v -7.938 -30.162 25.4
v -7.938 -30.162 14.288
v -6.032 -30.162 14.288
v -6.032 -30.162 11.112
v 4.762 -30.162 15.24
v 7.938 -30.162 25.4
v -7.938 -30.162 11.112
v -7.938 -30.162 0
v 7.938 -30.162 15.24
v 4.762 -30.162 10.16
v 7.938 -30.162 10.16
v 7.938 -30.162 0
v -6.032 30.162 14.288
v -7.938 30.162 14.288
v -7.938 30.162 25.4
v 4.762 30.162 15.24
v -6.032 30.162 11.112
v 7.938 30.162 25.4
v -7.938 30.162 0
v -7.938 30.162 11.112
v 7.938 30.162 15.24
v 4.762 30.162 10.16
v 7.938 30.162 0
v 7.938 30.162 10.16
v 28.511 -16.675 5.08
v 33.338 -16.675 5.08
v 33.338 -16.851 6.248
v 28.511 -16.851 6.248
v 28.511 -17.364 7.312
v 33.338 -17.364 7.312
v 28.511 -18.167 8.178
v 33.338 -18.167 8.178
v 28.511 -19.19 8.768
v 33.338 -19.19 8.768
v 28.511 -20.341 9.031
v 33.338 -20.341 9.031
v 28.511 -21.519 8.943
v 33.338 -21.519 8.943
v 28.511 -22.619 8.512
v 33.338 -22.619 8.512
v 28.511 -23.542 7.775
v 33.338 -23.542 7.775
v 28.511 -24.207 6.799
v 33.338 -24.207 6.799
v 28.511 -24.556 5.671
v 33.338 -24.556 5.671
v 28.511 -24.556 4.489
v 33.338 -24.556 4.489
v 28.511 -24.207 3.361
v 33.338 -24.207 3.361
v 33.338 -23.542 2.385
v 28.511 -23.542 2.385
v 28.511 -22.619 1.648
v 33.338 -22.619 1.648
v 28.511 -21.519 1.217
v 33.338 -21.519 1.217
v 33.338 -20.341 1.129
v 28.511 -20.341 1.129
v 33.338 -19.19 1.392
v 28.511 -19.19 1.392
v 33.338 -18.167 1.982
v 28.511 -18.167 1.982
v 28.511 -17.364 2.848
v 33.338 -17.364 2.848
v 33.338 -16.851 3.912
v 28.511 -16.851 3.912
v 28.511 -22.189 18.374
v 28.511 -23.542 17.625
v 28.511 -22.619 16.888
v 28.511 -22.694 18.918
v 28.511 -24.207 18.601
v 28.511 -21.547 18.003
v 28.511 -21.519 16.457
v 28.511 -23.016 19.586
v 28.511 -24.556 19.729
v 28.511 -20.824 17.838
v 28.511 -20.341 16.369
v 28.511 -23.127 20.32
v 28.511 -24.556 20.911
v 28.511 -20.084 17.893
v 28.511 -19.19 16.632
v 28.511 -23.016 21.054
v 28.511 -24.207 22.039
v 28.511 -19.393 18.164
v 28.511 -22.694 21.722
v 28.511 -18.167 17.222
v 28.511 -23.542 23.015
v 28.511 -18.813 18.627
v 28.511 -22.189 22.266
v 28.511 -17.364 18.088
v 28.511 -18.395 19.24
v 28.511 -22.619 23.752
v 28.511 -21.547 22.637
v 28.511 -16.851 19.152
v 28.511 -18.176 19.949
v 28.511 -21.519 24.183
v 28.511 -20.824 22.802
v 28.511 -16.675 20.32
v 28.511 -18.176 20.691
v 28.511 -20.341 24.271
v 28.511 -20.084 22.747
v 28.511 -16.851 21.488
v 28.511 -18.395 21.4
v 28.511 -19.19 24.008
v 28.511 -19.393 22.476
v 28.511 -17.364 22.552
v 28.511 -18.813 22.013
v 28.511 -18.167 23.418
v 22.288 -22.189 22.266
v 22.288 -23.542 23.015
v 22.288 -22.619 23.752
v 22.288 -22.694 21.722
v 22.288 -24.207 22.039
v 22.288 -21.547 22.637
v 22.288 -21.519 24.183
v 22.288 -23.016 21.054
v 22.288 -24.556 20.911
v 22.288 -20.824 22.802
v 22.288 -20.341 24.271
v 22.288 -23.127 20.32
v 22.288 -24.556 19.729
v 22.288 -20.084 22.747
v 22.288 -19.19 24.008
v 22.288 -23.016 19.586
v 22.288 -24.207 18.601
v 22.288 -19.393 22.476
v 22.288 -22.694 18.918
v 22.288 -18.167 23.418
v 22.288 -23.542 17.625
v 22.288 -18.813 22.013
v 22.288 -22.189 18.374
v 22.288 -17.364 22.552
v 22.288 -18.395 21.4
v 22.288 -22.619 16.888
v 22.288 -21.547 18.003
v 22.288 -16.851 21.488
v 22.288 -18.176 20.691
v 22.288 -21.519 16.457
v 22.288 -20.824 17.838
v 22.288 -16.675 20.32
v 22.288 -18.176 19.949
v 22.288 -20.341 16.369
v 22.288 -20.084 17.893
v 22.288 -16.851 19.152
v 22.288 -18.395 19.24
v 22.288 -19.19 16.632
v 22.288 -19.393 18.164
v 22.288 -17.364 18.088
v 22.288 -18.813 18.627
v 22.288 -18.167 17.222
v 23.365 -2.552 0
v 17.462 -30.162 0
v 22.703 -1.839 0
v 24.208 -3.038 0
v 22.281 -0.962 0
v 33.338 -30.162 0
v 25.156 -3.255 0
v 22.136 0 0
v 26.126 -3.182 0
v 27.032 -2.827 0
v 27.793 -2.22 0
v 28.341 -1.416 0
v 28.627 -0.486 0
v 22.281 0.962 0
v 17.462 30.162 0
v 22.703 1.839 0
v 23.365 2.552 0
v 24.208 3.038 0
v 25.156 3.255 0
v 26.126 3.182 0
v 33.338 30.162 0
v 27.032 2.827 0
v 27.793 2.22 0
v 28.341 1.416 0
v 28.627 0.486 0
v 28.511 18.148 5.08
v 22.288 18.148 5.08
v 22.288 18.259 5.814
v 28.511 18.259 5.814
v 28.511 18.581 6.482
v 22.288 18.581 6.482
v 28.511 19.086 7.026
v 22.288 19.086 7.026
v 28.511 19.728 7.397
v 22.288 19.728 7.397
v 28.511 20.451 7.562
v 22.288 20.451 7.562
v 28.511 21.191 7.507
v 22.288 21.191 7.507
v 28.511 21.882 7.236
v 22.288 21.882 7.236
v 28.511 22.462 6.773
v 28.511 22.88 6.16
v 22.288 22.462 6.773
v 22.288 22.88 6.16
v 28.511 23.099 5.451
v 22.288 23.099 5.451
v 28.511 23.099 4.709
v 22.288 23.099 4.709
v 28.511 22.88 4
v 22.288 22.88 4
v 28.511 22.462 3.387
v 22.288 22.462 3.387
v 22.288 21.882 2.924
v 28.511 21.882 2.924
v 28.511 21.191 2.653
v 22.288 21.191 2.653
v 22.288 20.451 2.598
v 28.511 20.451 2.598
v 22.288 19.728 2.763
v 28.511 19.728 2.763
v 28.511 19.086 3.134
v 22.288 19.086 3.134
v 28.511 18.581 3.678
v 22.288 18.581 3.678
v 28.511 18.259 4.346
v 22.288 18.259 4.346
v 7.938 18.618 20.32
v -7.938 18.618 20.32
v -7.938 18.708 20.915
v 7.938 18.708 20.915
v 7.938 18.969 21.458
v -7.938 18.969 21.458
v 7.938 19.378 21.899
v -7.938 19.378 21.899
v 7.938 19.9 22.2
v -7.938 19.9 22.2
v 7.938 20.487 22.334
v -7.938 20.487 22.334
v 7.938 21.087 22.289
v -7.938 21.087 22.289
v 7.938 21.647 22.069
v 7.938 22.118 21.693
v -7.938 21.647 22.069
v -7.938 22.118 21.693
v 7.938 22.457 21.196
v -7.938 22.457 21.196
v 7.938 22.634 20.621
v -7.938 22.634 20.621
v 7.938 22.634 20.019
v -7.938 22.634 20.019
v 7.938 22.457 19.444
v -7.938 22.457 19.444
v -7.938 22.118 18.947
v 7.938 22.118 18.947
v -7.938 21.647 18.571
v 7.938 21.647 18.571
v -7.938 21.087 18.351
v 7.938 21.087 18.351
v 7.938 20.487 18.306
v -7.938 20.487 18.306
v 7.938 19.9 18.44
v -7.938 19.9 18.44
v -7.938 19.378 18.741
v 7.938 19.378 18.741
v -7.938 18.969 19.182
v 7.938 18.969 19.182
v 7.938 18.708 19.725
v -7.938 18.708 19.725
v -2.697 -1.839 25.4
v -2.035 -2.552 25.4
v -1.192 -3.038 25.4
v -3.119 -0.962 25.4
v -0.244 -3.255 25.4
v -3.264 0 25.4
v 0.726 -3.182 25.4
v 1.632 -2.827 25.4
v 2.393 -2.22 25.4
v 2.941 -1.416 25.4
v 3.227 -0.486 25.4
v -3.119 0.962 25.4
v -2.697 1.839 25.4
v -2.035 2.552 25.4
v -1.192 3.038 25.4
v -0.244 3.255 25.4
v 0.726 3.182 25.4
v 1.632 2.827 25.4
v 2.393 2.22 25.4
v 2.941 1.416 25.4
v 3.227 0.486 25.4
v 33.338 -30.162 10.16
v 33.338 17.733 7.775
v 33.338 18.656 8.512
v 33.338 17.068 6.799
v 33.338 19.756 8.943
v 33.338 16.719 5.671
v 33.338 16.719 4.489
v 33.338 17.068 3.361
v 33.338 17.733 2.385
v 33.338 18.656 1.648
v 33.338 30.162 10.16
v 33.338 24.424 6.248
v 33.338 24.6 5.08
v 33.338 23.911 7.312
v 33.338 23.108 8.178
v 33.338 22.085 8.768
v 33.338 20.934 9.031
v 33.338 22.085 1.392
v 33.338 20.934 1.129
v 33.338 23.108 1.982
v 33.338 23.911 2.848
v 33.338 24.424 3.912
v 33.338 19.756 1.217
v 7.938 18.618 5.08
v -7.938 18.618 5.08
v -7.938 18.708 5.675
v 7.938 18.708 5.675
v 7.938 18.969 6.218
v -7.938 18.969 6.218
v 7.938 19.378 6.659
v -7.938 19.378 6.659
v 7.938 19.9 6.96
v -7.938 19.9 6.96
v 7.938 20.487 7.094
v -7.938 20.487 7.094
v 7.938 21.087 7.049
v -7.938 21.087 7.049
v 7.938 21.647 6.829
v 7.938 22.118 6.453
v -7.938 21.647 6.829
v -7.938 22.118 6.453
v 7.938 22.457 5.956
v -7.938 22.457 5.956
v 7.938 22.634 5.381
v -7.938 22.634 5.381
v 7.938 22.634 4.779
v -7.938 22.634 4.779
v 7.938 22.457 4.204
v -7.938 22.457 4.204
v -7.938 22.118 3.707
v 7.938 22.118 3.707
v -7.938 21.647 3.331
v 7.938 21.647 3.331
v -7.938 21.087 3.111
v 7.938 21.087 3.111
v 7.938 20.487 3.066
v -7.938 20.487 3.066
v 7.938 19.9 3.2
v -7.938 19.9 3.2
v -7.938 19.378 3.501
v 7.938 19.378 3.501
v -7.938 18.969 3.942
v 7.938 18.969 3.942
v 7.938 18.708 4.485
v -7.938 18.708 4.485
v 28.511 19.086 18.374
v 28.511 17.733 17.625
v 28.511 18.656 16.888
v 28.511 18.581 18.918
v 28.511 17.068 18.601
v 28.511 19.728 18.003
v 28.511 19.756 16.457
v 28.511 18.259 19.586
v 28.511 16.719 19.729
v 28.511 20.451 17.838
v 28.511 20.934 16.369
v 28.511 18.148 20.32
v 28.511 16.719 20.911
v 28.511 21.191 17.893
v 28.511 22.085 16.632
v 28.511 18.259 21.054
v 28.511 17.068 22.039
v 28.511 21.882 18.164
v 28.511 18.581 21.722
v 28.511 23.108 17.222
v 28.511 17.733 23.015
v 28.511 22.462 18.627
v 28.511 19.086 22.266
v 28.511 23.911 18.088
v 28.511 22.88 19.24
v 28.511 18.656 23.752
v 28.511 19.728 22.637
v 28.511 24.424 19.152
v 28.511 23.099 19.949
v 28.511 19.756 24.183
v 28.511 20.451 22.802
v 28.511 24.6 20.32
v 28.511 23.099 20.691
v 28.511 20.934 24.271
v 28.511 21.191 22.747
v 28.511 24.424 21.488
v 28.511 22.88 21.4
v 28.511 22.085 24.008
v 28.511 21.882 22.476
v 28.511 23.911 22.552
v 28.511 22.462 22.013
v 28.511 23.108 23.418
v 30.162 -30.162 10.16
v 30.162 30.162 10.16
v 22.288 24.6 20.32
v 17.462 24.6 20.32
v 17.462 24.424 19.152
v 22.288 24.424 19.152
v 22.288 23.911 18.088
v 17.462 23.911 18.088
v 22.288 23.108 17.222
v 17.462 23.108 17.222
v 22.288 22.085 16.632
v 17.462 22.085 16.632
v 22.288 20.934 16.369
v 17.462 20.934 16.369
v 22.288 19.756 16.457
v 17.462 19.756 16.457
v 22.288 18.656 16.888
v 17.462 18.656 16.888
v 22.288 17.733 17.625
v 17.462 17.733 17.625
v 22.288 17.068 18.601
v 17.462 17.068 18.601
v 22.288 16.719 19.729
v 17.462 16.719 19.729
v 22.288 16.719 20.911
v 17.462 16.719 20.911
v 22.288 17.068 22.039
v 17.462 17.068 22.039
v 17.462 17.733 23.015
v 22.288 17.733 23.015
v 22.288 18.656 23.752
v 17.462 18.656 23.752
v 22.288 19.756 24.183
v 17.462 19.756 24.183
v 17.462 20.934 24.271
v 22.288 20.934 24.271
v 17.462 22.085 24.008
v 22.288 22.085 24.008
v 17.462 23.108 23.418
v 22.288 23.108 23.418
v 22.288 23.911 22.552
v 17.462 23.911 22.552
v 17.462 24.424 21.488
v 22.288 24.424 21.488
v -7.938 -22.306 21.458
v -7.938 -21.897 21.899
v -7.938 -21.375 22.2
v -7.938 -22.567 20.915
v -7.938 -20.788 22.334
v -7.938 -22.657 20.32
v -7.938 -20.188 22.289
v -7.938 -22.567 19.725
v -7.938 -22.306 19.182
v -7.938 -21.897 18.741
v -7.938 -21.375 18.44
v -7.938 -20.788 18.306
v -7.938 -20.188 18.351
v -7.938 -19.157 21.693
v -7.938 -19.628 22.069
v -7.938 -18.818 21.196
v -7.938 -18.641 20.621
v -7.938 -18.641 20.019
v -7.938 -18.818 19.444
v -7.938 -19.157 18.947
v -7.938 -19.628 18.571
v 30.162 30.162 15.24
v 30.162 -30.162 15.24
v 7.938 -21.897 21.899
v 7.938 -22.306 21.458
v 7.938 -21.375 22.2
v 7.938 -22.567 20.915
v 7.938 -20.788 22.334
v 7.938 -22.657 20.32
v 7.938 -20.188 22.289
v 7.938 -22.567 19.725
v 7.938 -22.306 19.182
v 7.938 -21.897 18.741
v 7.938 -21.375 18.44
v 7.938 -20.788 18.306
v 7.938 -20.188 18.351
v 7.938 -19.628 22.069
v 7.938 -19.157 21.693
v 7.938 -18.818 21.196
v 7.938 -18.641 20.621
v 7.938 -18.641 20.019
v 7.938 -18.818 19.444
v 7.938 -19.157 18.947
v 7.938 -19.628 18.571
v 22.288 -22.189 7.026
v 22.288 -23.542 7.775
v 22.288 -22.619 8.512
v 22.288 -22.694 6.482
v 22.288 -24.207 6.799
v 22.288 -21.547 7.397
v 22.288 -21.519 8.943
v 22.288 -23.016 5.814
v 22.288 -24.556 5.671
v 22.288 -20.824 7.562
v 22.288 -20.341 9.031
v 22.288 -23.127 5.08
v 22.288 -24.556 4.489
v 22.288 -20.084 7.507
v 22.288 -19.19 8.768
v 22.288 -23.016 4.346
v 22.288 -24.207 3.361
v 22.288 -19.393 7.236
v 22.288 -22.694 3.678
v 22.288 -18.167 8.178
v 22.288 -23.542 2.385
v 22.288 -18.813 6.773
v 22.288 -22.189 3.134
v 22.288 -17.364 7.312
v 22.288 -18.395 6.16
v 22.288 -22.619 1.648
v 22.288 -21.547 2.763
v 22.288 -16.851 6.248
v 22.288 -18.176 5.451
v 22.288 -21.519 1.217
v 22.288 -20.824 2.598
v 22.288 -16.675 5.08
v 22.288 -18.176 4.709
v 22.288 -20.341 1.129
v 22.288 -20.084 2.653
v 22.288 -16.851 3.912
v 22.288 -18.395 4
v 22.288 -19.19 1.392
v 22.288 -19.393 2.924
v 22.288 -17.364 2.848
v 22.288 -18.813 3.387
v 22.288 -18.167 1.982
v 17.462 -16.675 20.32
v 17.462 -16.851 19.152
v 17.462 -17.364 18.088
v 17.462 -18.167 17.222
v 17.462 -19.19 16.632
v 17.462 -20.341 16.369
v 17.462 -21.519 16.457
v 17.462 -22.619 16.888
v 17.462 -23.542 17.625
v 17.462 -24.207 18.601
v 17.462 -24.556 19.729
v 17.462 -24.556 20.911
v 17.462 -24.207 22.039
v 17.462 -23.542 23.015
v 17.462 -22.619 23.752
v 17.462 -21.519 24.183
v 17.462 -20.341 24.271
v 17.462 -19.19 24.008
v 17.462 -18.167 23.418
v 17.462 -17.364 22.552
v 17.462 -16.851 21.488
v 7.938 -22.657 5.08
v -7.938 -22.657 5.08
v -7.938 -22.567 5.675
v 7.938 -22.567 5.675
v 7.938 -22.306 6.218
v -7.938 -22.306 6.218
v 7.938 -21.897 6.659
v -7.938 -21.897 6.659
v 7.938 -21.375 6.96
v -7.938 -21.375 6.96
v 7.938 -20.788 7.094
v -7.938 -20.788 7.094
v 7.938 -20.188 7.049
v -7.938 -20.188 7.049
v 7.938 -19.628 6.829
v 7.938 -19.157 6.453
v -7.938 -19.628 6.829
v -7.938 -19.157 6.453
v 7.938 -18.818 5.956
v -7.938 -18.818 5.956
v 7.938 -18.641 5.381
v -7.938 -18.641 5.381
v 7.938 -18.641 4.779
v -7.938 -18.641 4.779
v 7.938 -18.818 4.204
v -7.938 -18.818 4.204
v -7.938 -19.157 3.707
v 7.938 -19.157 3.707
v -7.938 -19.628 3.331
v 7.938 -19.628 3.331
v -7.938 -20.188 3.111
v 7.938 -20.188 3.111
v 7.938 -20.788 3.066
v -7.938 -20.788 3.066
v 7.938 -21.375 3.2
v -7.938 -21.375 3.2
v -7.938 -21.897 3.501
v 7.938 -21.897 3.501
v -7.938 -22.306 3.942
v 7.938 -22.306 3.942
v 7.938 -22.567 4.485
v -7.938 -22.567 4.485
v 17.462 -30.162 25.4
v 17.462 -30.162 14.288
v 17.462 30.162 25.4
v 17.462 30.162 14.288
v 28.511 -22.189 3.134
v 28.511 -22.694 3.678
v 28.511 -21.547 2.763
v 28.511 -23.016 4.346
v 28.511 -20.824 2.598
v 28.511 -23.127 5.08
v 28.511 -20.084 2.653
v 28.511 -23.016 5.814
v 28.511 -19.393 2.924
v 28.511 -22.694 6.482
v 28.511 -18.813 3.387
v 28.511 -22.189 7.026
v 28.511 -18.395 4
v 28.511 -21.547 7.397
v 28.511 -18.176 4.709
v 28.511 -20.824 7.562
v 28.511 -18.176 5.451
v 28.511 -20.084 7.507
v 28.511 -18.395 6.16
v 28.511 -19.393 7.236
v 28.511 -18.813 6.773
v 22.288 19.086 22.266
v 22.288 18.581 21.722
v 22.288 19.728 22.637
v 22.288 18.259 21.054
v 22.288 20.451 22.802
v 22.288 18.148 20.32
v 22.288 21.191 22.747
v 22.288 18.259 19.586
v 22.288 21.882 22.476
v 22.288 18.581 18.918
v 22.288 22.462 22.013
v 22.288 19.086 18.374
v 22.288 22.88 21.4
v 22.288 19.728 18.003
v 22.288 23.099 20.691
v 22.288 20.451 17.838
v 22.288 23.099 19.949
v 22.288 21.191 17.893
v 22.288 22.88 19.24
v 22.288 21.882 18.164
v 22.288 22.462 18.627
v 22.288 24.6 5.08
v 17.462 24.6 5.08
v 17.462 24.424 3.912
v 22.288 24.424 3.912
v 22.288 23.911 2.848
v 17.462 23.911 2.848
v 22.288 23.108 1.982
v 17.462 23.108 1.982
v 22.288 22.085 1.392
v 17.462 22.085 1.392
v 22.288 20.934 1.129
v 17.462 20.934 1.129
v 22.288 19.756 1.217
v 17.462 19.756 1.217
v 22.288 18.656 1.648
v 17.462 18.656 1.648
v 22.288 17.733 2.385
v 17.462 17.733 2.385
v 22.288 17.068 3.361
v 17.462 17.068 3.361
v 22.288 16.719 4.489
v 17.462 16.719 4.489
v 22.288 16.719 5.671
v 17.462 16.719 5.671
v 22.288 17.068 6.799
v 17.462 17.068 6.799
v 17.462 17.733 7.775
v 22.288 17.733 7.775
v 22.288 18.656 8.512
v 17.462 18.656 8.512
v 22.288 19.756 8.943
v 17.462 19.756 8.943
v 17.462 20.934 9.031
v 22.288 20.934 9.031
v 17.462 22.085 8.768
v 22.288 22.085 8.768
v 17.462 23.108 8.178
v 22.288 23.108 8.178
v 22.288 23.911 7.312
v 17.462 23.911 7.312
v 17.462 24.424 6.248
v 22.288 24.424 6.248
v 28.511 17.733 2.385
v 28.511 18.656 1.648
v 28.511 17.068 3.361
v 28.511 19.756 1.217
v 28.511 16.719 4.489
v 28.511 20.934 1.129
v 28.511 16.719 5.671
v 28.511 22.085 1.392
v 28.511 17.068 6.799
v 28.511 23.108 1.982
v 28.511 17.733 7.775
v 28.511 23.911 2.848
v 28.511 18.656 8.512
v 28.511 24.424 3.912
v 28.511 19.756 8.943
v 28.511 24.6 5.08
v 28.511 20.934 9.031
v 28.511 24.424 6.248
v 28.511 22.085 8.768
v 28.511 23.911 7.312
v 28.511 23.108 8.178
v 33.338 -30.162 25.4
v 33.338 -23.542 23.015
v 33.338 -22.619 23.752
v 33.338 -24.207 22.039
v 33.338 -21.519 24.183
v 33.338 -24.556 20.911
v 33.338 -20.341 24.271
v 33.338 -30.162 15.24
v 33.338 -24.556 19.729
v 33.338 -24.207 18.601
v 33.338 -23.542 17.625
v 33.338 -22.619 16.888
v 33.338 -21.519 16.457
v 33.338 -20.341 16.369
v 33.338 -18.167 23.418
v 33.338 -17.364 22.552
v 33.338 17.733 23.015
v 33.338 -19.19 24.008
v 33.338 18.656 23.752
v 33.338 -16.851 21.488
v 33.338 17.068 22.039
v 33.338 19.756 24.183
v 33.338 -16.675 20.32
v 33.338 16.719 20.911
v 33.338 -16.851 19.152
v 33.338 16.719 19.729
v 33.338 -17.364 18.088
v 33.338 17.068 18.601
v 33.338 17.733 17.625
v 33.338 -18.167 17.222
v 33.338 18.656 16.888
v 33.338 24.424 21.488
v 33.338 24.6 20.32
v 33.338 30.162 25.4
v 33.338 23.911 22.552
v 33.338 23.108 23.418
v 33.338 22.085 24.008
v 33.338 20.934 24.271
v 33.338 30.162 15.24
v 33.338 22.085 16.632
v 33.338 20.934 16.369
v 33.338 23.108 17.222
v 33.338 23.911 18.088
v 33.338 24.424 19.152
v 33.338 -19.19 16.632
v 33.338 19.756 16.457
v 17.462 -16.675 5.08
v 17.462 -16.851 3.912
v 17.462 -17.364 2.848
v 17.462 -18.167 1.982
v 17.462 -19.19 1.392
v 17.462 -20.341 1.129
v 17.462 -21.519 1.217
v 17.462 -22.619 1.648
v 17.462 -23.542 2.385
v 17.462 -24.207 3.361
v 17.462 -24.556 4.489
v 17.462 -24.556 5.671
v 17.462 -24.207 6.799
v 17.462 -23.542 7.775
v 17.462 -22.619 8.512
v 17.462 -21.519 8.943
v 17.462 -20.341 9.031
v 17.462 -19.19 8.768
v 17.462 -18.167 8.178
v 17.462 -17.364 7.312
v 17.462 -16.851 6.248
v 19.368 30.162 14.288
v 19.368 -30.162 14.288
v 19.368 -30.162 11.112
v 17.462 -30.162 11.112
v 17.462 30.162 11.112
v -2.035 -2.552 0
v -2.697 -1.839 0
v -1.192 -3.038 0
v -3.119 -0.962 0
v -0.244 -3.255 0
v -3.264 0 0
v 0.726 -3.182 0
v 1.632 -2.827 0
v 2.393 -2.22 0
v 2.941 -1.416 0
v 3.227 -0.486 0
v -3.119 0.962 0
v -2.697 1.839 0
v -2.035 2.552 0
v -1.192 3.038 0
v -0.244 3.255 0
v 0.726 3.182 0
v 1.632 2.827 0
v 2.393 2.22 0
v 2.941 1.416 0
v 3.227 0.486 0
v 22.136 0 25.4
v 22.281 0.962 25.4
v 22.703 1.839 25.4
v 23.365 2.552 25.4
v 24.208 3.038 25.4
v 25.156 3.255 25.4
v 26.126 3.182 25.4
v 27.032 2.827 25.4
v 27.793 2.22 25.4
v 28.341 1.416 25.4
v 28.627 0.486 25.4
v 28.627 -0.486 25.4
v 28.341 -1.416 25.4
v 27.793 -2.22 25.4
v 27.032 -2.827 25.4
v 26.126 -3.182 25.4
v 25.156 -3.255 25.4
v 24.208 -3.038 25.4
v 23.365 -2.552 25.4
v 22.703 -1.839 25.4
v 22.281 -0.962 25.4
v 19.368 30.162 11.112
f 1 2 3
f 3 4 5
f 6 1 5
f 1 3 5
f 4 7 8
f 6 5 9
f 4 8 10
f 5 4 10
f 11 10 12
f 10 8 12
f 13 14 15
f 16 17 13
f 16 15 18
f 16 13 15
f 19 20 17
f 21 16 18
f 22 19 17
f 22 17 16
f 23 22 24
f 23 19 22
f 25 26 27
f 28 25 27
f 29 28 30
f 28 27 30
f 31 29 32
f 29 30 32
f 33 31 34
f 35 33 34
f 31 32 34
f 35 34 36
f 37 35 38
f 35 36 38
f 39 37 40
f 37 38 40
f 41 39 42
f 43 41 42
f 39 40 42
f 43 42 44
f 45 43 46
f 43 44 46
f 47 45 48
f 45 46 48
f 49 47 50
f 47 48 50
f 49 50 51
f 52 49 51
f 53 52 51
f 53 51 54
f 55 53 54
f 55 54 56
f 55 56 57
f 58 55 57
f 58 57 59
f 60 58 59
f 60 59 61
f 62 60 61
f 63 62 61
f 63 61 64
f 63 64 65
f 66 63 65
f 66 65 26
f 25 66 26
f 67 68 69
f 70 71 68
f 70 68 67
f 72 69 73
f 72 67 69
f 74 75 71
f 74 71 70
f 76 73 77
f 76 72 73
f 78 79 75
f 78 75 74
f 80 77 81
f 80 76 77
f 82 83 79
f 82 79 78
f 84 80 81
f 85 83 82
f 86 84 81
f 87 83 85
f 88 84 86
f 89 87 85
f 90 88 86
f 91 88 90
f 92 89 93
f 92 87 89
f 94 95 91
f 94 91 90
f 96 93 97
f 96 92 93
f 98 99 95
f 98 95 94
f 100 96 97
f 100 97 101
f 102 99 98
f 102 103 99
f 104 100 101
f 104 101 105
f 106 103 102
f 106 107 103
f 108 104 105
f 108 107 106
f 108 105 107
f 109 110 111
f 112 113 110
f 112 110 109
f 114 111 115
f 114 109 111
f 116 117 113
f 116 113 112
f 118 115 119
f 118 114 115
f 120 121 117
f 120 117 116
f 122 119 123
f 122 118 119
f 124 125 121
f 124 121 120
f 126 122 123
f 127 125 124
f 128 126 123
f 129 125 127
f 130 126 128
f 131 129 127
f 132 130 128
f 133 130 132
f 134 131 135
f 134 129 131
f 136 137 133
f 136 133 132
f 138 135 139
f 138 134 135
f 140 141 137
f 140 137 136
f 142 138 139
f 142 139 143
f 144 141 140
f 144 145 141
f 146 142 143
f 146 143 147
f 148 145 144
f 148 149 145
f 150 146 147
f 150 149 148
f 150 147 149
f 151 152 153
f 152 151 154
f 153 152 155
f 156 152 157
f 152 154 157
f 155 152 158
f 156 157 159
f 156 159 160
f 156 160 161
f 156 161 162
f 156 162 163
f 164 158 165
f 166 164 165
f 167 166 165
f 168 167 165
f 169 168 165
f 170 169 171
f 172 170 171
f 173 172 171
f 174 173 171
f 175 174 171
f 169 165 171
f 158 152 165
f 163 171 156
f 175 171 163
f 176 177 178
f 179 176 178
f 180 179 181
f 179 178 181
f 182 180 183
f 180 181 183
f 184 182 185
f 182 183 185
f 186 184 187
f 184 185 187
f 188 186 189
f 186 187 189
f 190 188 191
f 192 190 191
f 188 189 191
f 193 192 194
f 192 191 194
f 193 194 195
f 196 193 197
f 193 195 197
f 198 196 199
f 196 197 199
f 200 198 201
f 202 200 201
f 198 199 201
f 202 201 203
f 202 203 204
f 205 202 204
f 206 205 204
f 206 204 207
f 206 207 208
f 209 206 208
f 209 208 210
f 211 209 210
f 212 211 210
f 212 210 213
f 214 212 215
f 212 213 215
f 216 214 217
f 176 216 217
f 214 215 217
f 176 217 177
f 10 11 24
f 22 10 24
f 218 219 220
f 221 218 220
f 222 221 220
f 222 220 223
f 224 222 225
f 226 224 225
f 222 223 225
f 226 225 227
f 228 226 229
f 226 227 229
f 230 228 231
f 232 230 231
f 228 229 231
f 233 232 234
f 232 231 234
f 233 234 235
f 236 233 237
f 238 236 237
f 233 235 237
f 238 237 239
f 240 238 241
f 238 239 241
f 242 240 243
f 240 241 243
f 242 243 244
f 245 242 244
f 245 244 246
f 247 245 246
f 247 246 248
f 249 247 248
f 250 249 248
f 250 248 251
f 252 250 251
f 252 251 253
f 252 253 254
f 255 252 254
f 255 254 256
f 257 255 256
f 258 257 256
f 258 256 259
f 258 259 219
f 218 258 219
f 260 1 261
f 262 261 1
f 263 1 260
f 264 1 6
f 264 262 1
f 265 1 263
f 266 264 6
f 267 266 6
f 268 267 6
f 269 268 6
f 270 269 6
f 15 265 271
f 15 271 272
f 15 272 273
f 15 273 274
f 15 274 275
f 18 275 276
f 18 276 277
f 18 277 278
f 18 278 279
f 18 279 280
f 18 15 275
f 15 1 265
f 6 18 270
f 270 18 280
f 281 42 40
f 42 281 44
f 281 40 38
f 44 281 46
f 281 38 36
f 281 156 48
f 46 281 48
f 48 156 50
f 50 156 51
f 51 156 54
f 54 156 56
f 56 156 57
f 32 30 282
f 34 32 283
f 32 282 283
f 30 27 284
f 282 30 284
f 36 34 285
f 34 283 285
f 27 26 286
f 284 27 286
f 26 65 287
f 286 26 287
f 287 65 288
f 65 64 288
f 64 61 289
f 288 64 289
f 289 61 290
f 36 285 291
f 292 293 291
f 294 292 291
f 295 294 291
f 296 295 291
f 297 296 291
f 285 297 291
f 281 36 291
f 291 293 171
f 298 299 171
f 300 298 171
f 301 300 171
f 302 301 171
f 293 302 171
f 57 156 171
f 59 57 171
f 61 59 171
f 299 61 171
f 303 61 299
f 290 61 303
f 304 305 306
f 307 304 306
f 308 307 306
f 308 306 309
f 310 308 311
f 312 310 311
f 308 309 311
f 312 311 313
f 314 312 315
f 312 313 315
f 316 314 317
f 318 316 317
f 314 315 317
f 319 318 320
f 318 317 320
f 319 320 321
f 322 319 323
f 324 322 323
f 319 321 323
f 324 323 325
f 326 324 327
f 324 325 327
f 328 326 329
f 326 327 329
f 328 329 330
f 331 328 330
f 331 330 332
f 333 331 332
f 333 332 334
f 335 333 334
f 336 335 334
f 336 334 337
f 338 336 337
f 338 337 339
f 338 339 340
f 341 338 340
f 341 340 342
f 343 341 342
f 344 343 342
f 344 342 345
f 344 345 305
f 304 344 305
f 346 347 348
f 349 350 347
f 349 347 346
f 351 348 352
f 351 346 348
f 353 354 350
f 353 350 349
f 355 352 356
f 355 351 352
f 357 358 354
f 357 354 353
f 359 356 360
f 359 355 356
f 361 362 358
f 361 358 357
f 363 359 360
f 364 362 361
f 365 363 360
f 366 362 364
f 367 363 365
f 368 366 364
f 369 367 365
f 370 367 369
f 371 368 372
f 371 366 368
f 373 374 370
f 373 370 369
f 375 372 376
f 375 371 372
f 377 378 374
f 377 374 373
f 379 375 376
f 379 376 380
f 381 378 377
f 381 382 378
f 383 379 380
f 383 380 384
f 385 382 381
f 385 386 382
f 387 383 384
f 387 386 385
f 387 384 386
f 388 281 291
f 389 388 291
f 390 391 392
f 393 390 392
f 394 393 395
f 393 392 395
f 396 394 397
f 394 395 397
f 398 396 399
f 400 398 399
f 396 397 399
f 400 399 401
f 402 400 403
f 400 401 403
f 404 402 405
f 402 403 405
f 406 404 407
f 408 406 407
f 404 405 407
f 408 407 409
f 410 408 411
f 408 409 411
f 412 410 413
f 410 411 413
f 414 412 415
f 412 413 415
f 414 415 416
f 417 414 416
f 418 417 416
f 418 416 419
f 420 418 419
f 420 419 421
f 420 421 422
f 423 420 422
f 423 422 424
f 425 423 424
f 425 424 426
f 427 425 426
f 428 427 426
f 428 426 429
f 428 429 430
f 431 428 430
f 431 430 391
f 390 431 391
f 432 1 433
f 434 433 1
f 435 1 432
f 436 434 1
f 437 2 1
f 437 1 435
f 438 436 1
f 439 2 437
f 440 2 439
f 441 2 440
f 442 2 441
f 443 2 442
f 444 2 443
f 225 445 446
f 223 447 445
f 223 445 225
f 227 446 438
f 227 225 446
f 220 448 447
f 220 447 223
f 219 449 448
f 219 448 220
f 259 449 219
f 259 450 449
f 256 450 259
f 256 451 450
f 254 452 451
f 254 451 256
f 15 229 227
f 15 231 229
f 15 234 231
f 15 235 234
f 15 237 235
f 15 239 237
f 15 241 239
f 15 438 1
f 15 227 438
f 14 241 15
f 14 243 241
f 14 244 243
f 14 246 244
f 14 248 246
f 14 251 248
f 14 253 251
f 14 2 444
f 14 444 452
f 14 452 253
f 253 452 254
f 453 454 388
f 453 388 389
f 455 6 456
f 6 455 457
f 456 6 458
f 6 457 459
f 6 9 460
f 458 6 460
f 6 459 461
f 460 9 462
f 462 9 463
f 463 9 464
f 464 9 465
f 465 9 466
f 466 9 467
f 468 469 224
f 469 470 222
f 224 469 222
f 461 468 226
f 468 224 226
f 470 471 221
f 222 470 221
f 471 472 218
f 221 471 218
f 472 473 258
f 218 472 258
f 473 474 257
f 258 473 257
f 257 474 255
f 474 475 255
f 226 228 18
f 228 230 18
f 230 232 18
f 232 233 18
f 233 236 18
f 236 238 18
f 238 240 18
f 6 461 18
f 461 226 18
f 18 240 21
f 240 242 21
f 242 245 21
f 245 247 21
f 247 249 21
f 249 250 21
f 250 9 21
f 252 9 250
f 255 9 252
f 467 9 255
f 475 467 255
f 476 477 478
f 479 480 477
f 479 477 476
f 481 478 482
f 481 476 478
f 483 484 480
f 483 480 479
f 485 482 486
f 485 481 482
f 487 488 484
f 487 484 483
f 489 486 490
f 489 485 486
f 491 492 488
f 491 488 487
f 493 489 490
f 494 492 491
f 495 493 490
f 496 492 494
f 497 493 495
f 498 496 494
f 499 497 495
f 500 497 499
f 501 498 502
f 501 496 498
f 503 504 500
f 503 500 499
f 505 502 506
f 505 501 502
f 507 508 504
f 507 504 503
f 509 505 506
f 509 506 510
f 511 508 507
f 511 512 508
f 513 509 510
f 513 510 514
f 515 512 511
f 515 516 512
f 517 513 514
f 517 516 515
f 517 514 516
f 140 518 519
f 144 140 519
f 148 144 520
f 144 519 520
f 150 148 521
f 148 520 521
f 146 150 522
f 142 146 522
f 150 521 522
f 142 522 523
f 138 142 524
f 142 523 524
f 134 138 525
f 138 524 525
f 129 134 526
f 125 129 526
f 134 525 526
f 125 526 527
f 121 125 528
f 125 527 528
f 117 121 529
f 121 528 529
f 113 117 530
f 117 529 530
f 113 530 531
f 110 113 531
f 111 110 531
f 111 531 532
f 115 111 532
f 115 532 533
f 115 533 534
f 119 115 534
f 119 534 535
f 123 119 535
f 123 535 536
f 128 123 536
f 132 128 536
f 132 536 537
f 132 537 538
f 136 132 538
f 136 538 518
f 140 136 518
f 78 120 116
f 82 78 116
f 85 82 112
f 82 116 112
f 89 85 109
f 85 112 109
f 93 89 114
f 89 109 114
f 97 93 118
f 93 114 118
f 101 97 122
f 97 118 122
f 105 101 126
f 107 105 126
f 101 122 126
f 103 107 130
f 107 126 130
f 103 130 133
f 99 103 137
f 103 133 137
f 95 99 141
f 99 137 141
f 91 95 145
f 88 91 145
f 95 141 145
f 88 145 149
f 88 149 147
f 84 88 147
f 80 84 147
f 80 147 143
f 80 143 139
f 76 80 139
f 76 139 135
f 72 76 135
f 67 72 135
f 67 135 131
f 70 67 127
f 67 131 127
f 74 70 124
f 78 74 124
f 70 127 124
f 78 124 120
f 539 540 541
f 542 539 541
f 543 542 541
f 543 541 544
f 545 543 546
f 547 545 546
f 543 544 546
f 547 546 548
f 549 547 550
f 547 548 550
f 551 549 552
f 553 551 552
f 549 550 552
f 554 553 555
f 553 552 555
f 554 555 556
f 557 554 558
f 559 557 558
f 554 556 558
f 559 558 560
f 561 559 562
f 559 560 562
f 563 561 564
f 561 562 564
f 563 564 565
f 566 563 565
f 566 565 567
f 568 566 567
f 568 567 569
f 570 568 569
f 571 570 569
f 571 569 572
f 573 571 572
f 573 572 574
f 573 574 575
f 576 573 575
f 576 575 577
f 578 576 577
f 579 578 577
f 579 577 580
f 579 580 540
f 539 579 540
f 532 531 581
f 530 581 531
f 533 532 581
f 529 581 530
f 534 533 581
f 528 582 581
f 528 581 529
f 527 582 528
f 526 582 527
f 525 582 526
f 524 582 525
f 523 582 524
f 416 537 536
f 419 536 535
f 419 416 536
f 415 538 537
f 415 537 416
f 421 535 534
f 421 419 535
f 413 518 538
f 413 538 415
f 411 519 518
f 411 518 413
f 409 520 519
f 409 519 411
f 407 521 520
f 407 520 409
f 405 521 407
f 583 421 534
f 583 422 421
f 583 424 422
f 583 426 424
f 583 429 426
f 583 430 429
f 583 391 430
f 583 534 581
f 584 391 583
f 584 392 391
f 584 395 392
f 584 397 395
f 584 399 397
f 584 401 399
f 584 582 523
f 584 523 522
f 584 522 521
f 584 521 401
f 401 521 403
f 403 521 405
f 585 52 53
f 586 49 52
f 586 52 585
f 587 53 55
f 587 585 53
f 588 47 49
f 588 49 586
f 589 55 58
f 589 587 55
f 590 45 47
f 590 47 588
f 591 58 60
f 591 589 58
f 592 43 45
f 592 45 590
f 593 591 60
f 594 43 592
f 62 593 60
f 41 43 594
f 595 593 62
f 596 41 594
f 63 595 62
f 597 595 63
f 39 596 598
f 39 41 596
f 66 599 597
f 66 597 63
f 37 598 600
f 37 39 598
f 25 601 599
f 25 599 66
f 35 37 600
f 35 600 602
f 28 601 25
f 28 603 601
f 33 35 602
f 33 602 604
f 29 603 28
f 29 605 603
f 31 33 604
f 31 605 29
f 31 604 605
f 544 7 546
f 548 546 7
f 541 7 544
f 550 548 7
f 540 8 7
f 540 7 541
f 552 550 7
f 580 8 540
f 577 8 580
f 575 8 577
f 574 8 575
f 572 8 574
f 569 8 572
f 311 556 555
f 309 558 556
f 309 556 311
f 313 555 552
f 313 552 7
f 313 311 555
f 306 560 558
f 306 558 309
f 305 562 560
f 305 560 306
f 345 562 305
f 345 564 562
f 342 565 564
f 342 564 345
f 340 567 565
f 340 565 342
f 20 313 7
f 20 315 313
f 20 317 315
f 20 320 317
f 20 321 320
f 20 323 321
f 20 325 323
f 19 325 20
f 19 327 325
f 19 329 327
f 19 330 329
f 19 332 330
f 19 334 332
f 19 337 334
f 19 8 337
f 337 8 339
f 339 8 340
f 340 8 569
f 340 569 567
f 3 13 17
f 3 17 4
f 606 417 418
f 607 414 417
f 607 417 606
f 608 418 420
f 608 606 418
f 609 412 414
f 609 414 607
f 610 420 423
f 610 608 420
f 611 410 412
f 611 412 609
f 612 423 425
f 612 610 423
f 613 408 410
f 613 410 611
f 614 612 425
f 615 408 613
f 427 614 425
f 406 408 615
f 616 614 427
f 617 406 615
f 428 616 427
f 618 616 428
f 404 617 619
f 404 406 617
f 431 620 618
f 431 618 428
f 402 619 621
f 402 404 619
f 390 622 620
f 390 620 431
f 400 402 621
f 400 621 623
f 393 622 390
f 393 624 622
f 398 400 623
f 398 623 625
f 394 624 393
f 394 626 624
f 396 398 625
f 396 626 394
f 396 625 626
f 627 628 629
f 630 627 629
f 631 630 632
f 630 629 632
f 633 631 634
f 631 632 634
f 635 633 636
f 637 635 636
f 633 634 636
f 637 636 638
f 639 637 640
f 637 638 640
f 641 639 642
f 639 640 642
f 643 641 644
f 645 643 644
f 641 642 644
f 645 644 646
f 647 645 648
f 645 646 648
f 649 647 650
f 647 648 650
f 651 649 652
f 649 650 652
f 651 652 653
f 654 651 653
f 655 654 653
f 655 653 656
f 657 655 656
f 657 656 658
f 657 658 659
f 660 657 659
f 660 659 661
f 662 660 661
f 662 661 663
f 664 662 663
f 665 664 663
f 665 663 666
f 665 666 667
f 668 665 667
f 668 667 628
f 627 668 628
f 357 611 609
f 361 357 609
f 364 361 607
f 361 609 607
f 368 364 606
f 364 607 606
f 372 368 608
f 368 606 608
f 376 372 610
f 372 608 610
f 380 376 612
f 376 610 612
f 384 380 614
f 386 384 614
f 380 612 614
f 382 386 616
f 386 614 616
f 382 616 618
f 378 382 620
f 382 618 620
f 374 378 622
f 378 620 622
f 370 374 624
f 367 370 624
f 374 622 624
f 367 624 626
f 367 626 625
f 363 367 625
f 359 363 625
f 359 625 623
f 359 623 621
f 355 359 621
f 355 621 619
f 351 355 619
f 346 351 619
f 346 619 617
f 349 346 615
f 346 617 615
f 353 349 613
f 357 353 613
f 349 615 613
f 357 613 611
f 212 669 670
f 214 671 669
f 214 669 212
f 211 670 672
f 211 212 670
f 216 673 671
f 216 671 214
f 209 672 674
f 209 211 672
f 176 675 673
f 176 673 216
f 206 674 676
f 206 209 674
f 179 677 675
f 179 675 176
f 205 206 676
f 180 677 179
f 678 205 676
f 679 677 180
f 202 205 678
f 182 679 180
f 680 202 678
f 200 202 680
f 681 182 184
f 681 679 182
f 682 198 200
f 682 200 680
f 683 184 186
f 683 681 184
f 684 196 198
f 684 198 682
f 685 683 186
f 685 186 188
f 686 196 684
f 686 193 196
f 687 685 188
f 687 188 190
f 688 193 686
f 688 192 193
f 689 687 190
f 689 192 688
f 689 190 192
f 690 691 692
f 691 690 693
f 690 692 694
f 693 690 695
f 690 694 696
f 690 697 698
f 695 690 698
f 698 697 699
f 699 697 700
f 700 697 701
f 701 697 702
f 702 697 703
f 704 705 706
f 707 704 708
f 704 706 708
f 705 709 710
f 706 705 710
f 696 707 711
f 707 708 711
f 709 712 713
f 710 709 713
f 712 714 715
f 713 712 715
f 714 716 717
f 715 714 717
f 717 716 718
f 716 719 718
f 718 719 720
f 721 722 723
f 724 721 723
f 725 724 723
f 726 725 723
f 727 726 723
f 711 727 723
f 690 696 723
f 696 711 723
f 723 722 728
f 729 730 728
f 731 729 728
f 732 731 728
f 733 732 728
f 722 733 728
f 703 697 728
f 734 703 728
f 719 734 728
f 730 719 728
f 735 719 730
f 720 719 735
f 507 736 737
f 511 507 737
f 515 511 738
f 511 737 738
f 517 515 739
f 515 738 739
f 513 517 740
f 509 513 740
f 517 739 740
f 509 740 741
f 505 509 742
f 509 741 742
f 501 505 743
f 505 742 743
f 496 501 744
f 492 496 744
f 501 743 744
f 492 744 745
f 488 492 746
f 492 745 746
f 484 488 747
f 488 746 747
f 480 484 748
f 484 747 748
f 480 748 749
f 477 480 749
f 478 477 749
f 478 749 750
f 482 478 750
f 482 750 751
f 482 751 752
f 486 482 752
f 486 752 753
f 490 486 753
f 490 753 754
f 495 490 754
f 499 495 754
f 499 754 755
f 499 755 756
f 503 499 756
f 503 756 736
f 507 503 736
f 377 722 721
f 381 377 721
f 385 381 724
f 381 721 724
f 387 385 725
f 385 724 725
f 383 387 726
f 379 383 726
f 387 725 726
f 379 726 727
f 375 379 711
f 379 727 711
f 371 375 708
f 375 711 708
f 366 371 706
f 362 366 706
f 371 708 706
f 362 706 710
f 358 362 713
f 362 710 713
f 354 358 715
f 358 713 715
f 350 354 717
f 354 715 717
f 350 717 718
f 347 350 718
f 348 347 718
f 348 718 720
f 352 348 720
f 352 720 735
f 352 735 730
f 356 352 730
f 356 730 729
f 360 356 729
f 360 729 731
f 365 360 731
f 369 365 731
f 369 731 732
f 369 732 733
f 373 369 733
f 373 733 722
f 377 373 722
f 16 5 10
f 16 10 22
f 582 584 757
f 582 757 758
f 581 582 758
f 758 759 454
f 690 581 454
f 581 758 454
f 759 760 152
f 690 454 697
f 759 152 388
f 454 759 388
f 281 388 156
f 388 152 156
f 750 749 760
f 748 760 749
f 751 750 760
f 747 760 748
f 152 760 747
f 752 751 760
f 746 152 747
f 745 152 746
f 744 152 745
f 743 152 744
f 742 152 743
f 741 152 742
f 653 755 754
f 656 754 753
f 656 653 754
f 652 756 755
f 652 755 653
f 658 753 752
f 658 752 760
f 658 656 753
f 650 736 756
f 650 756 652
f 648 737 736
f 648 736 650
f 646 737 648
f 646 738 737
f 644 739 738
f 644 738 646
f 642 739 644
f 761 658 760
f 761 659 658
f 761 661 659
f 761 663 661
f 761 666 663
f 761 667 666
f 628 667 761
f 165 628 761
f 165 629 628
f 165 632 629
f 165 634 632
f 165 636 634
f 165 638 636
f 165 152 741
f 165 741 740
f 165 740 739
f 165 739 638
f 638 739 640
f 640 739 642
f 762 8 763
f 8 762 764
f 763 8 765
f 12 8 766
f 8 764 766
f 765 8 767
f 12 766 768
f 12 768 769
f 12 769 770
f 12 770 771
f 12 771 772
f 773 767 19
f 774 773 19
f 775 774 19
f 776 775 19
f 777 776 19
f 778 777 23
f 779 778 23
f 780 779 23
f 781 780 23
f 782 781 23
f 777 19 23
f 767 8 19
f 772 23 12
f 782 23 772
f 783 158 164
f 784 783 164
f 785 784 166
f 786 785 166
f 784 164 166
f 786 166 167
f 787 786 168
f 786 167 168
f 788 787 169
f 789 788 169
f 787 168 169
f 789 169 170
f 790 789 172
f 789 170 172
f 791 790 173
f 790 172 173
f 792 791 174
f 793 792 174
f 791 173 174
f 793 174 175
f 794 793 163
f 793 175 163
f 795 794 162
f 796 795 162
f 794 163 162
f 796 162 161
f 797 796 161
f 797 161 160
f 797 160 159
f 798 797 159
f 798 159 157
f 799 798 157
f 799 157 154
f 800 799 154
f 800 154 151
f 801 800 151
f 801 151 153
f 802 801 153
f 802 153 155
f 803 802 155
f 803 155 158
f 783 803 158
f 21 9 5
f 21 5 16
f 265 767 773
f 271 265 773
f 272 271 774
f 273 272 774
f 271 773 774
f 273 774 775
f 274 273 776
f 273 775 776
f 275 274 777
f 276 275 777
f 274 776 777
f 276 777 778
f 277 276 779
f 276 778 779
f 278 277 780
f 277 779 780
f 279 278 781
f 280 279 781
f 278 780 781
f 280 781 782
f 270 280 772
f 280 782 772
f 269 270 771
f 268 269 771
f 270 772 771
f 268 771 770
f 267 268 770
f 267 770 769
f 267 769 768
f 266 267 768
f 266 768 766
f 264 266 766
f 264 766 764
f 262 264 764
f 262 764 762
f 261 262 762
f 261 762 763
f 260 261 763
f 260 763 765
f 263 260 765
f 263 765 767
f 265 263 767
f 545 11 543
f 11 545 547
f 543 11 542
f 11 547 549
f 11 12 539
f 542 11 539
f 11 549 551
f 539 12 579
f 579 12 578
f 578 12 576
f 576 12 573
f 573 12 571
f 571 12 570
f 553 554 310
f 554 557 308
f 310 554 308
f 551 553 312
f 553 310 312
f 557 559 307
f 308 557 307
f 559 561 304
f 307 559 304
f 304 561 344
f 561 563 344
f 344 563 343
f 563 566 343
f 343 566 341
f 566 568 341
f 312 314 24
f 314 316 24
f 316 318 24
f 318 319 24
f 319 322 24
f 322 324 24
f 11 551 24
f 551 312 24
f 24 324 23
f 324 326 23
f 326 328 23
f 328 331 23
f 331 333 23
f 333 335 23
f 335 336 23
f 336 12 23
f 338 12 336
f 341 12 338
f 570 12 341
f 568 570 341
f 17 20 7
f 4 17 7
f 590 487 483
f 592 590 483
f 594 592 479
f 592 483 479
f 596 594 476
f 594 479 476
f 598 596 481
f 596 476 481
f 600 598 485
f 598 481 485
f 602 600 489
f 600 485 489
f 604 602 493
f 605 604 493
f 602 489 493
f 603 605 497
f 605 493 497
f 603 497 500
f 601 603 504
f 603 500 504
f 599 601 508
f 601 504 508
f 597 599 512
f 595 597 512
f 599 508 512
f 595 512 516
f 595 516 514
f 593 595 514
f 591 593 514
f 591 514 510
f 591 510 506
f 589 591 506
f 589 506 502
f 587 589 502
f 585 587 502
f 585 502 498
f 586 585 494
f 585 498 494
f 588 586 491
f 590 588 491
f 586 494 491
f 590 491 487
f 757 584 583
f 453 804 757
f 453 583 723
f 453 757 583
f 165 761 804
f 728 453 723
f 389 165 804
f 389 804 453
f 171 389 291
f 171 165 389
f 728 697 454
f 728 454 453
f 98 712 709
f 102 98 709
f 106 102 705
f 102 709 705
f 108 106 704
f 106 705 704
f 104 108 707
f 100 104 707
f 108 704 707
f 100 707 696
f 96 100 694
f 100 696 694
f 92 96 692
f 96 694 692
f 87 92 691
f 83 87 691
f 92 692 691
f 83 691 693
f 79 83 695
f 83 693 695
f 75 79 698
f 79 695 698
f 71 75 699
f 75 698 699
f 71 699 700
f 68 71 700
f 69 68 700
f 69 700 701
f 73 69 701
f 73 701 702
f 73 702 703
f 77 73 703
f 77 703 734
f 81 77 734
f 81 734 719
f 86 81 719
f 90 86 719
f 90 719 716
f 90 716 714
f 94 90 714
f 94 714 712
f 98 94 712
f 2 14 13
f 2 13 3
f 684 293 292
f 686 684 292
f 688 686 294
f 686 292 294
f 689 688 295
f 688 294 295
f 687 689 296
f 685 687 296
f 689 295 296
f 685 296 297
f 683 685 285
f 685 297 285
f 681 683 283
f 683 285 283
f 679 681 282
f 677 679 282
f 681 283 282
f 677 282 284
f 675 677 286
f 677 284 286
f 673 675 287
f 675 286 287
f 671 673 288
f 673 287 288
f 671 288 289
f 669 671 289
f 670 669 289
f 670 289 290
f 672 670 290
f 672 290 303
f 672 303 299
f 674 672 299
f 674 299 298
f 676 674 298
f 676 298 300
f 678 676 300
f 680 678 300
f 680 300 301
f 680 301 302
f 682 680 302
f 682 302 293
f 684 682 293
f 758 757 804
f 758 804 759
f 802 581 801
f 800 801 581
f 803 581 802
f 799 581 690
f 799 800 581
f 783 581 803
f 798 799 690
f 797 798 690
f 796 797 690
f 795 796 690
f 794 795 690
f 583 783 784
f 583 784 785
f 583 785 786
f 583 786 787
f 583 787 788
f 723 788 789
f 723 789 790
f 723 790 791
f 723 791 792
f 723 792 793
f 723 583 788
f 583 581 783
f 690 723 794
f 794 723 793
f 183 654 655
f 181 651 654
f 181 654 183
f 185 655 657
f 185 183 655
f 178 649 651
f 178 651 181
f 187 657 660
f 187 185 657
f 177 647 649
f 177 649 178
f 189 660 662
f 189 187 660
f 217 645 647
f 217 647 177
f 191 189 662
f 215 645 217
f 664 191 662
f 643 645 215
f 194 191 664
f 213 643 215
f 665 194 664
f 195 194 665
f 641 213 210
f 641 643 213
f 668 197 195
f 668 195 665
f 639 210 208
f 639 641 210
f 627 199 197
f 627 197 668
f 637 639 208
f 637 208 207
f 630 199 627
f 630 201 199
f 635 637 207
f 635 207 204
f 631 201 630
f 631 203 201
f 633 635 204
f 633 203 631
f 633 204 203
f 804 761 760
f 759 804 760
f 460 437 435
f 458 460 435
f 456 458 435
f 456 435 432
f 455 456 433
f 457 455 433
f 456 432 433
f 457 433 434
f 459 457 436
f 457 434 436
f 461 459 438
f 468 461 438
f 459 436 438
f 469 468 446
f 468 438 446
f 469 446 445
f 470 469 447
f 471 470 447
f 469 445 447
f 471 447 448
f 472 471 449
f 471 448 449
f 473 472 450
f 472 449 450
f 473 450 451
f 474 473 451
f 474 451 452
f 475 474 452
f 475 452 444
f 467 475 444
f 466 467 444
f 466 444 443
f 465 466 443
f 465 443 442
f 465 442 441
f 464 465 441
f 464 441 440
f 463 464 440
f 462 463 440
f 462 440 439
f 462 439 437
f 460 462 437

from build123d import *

# Parameters (mm, degrees)
F0_W            = 15.875
F0_H            = 60.325
F1_DEPTH        = 25.4
F3_D            = 6.5278
F4_W            = 60.325
F4_H            = 5.08
F5_DEPTH        = 3.175
F6_W            = 60.325
F6_H            = 3.175
F7_DEPTH        = 1.905
F10_D           = 4.0386
F12_D           = 4.9784
F12_CBORE_D     = 7.9248
F12_CBORE_DEPTH = 4.826
F14_D           = 4.9784
F14_START       = 9.525
F14_CBORE_D     = 7.9248
F14_CBORE_DEPTH = 4.826


with BuildPart() as f1:
    # F0 (on Top) → F1 (new body)
    with BuildSketch(Plane.XY):
        Rectangle(F0_W, F0_H)
    extrude(amount=F1_DEPTH)

    # F3 (through all)
    with Locations(Plane.XY.offset(25.4)):
        with Locations((0, 0)):
            Hole(F3_D / 2)

    # F4 (on face) → F5 (cut)
    with BuildSketch(Plane.YZ.offset(7.9375)):
        with Locations((0, 12.7)):
            Rectangle(F4_W, F4_H)
    extrude(amount=-F5_DEPTH, mode=Mode.SUBTRACT)

    # F6 (on face) → F7 (cut)
    with BuildSketch(Plane(origin=(-7.9375, 0, 0), x_dir=(0, -1, 0), z_dir=(-1, 0, 0))):
        with Locations((0, 12.7)):
            Rectangle(F6_W, F6_H)
    extrude(amount=-F7_DEPTH, mode=Mode.SUBTRACT)


with BuildPart() as f8_1:
    # F8: copy of F1
    add(f1.part.moved(Location((25.4, 0, 0))))

    # F12 (through all)
    with Locations(Plane.YZ.offset(33.3375)):
        with Locations((-20.6375, 20.32), (20.6375, 20.32), (20.6375, 5.08), (-20.6375, 5.08)):
            CounterBoreHole(F12_D / 2, F12_CBORE_D / 2, F12_CBORE_DEPTH)

    # F14 (through all)
    # its depths count from where the whole tool has entered the part; down to there all is cleared
    with Locations(Plane(origin=(7.9375, 0, 0), x_dir=(0, 1, 0), z_dir=(-1, 0, 0)).offset(-F14_START)):
        with Locations((20.6375, -20.32), (-20.6375, -20.32), (-20.6375, -5.08), (20.6375, -5.08)):
            CounterBoreHole(F14_D / 2, F14_CBORE_D / 2, F14_CBORE_DEPTH)


with BuildPart() as f1_1:
    add(f1.part)

    # F10 (through all)
    with Locations(Plane.YZ.offset(7.9375)):
        with Locations((-20.6375, 20.32), (-20.6375, 5.08), (20.6375, 5.08), (20.6375, 20.32)):
            Hole(F10_D / 2)


solid = Compound([f8_1.part, f1_1.part])
